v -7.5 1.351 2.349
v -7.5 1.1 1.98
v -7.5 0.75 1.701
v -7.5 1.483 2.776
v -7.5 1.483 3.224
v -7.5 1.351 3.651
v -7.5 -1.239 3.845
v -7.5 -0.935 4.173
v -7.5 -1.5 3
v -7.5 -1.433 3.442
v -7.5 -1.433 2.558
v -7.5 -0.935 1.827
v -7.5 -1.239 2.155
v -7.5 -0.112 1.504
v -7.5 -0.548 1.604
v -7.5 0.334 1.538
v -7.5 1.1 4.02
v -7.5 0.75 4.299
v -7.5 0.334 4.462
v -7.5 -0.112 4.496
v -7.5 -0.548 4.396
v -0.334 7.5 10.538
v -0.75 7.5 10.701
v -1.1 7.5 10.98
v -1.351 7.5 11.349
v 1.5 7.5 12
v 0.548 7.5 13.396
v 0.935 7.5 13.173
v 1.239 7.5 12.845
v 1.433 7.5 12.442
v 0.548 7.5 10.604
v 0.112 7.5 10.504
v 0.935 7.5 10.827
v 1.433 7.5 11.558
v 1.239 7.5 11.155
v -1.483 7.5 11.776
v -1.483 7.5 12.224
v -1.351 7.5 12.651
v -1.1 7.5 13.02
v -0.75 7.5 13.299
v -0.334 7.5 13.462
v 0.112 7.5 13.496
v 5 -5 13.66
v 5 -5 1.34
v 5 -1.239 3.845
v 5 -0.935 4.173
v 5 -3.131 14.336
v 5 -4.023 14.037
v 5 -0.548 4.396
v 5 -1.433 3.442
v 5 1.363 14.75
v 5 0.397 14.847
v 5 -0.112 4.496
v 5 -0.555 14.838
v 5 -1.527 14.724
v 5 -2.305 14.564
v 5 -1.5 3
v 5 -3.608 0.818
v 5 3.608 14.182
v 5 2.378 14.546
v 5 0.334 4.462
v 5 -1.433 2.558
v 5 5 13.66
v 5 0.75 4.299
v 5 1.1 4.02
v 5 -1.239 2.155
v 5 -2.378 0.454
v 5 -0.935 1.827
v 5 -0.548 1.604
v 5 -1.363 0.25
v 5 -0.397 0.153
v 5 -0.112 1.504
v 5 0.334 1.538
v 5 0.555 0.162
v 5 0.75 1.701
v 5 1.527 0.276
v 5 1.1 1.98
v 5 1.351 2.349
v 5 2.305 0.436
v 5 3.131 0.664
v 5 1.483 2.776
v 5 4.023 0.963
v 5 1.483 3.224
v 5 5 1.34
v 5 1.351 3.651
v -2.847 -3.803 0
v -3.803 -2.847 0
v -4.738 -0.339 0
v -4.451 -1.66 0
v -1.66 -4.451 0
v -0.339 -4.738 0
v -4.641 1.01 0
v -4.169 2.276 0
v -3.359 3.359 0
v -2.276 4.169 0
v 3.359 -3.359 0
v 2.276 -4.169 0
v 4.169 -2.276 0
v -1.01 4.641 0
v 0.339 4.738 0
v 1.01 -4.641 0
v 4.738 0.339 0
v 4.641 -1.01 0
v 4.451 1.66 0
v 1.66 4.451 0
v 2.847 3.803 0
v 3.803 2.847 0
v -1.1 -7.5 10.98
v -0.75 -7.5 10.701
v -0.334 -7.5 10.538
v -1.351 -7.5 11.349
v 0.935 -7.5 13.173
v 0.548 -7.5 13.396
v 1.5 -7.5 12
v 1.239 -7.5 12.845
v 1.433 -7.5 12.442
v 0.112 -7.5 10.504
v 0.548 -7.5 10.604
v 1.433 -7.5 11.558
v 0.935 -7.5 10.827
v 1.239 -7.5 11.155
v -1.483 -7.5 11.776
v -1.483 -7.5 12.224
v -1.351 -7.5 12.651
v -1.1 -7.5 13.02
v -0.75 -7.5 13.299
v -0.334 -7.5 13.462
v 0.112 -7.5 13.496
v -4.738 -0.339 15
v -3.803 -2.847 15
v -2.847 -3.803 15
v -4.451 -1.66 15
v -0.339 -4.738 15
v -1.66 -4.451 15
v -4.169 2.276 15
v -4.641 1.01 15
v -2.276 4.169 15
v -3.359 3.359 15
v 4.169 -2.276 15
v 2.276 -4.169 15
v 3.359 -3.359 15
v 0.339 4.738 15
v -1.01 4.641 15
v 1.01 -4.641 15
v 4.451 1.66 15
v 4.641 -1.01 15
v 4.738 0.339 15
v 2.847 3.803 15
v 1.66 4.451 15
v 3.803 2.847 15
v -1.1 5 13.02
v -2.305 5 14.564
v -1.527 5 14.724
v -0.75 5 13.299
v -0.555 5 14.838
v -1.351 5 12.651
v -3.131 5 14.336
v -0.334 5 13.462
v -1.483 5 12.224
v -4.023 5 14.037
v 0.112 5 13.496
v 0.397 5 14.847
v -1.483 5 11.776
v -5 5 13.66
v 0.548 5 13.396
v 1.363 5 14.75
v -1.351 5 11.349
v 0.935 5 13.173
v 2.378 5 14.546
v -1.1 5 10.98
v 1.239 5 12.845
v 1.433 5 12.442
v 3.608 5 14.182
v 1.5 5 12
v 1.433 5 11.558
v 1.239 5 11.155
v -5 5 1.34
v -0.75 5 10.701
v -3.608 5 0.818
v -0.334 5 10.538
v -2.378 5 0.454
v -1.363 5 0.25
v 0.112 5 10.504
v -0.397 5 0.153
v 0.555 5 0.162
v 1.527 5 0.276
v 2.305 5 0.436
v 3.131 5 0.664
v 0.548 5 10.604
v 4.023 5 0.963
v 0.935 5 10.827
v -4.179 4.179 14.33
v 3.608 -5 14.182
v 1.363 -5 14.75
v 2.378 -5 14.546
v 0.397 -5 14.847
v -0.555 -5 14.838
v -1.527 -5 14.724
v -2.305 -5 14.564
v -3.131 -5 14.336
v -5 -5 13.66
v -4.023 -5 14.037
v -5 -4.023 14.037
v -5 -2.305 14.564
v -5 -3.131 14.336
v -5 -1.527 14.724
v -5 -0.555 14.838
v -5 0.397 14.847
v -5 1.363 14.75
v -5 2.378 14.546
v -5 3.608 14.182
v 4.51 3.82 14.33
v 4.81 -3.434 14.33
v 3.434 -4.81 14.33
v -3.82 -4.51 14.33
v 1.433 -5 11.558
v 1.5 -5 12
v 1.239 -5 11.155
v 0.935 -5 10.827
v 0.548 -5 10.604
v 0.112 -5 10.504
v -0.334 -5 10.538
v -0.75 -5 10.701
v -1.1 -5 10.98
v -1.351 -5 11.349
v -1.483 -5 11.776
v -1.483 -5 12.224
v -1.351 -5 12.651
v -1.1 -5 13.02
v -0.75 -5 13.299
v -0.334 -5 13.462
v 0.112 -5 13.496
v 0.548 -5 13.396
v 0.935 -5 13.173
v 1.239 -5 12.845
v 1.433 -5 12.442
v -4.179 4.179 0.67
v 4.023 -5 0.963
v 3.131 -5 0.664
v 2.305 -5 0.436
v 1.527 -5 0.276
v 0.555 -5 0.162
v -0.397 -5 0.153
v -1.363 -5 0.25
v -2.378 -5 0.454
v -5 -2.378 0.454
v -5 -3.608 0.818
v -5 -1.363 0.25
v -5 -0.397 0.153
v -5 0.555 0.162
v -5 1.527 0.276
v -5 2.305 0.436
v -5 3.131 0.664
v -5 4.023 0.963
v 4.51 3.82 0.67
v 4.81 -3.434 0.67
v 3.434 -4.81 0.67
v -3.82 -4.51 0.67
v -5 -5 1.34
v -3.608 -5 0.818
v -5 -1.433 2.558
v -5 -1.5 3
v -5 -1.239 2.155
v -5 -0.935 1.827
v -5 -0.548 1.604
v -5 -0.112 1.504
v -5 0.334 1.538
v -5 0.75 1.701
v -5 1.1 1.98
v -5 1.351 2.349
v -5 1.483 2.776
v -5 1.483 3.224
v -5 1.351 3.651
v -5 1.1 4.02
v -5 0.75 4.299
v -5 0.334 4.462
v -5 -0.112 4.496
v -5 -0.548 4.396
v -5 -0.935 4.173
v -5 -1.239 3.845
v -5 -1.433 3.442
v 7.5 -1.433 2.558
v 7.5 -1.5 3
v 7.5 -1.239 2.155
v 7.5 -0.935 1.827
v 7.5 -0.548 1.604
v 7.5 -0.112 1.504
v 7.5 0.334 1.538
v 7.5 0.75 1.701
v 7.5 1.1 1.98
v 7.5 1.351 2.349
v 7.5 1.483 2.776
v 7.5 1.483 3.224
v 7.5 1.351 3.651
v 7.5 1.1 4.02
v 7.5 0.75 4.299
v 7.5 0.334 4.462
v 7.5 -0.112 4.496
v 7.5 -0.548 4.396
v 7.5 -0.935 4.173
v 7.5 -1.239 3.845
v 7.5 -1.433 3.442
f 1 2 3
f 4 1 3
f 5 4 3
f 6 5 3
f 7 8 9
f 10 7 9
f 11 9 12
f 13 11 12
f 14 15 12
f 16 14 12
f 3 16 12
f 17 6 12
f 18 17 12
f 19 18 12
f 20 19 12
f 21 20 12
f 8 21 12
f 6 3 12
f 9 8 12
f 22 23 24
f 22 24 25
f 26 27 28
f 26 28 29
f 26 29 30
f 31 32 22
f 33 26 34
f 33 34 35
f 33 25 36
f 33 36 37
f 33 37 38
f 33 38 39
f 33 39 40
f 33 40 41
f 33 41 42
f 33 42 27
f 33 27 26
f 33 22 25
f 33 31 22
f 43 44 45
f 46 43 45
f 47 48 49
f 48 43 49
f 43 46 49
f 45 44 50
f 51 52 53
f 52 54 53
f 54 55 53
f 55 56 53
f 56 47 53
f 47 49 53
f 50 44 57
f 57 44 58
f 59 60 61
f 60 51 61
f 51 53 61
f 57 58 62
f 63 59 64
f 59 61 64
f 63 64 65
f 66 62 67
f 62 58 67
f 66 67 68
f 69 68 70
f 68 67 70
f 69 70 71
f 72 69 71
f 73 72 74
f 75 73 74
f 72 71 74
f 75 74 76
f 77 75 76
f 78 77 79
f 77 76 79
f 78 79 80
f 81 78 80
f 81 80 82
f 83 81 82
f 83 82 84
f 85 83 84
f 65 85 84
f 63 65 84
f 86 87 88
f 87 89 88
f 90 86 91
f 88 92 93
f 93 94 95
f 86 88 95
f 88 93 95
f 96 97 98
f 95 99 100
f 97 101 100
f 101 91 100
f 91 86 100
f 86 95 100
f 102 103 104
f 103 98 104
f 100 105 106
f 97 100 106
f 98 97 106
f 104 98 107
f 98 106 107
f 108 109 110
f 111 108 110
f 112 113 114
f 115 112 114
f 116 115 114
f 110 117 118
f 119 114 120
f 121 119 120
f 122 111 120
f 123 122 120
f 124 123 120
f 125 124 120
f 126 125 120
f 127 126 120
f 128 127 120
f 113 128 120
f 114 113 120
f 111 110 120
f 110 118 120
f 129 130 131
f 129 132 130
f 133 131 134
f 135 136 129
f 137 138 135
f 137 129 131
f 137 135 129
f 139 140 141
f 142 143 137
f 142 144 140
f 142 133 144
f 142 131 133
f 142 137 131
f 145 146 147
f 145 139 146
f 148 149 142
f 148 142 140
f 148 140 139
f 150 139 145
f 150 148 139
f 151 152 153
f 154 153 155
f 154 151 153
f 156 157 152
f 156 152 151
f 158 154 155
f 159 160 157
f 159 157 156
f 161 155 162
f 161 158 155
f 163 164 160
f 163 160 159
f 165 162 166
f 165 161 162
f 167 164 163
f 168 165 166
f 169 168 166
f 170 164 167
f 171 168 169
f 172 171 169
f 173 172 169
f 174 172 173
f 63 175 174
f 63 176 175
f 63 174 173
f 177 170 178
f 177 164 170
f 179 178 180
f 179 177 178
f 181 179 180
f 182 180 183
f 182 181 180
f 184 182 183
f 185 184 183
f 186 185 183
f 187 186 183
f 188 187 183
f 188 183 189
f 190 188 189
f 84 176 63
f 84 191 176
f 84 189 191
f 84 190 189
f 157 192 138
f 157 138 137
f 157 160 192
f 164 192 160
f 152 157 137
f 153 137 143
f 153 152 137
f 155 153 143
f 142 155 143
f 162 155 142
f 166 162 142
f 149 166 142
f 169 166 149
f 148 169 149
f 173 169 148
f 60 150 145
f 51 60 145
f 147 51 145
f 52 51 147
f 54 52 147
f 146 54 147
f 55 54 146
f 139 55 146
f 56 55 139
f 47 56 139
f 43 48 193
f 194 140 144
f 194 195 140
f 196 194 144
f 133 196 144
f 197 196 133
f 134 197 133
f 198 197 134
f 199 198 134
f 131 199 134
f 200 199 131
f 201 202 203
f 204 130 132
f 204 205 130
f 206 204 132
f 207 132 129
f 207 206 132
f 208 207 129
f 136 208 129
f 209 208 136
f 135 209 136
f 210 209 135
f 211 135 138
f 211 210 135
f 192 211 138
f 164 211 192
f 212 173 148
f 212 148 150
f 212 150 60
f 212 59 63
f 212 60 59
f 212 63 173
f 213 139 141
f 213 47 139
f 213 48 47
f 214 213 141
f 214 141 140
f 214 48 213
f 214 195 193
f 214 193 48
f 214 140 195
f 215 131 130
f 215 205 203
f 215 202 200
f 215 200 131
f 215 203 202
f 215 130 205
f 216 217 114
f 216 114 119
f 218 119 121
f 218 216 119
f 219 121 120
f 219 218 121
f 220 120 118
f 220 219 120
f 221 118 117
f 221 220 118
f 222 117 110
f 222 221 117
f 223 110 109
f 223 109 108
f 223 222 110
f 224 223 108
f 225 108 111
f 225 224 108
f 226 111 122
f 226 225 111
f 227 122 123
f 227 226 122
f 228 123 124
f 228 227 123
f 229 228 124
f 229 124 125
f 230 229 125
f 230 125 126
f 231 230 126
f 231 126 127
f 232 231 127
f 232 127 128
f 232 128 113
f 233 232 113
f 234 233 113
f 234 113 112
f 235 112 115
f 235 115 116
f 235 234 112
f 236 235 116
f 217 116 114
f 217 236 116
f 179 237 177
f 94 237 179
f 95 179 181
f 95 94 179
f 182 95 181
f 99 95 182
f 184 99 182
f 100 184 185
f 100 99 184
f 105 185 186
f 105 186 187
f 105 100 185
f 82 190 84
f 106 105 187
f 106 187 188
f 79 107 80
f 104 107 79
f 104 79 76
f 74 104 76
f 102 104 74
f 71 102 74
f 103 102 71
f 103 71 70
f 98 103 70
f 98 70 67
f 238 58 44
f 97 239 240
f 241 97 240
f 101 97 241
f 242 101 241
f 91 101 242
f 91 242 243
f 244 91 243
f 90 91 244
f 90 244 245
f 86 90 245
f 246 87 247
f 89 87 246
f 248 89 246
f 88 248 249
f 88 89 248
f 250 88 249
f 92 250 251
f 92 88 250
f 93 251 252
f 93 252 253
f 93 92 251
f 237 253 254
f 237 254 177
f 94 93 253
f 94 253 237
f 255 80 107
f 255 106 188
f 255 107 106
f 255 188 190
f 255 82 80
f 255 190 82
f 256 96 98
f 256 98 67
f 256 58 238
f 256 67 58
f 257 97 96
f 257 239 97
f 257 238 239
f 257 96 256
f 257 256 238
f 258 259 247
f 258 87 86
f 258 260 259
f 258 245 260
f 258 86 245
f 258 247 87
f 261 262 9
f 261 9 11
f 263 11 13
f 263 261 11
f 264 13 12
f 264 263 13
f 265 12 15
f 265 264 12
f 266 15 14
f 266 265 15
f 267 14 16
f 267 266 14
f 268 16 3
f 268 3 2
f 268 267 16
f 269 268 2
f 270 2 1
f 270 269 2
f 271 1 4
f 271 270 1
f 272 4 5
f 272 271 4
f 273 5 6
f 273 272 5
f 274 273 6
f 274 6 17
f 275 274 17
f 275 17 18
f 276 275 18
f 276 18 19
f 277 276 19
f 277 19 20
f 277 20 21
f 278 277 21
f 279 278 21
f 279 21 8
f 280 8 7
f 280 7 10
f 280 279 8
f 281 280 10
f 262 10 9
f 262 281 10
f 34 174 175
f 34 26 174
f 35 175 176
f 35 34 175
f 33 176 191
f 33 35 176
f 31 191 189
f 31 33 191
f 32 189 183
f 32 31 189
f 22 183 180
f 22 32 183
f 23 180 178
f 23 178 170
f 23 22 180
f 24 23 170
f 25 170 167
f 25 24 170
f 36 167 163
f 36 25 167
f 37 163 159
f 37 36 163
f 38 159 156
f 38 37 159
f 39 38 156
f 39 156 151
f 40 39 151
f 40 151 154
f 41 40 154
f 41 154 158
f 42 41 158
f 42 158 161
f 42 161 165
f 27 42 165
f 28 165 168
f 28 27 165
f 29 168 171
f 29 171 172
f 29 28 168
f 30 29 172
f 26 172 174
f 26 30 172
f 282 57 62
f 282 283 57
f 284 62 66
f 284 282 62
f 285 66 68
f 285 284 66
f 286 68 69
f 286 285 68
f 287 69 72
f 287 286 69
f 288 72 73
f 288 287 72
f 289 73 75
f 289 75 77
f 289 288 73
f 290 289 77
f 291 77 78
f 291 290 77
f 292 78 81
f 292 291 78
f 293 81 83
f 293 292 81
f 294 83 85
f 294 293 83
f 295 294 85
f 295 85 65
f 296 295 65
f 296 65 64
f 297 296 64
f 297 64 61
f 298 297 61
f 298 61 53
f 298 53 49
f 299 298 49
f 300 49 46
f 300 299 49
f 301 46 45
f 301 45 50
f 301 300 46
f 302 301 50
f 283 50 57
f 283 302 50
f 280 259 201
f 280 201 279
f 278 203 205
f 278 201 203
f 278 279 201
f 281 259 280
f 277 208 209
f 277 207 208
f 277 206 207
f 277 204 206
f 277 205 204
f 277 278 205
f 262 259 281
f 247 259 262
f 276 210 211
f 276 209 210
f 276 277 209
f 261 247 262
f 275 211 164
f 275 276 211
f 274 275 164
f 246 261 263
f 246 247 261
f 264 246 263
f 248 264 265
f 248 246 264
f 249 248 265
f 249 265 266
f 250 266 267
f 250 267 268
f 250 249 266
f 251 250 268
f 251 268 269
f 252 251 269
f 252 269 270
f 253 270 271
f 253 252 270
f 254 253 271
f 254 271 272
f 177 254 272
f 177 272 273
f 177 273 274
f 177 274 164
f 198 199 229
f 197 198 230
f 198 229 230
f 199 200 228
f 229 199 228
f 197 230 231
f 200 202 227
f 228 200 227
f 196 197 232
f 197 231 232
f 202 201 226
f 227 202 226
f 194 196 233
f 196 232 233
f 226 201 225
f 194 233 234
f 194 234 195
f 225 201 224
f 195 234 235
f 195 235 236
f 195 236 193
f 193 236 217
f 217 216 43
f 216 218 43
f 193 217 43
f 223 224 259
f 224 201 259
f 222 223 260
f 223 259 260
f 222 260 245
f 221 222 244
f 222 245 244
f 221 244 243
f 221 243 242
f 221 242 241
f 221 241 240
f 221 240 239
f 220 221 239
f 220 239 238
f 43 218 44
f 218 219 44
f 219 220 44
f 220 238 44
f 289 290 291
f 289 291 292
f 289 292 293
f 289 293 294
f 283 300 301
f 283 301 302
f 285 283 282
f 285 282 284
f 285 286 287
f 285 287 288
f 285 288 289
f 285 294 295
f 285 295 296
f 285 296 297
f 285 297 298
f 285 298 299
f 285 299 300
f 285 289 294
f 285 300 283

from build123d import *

# Parameters (mm, degrees)
SKETCH1_W           = 10
SKETCH1_H           = 10
BOSS_EXTRUDE1_DEPTH = 15
SKETCH3_R           = 1.5
BOSS_EXTRUDE2_DEPTH = 7.5
SKETCH4_R           = 1.5
BOSS_EXTRUDE3_DEPTH = 7.5


with BuildPart() as part:
    # Sketch1 → Boss-Extrude1 (new body)
    with BuildSketch(Plane.XY):
        Rectangle(SKETCH1_W, SKETCH1_H)
    extrude(amount=BOSS_EXTRUDE1_DEPTH)

    # Sketch2 → Cut-Revolve1 (revolve, cut)
    with BuildSketch(Plane(origin=(0, 0, 0), x_dir=(1, 0, 0), z_dir=(0, 1, 0)), mode=Mode.PRIVATE) as cut_revolve1_sk:
        Polygon((-4.75, 0), (-15.04, 0), (-15.04, -15), (-4.75, -15), (-12.5, -10.525535414), (-12.5, -4.474464586), align=None)
    revolve(cut_revolve1_sk.sketch.rotate(Axis((0, 0, 15.75), (0, 0, -1)), 44.999991596), axis=Axis((0, 0, 15.75), (0, 0, -1)), mode=Mode.SUBTRACT)

    # Sketch3 → Boss-Extrude2 (add, symmetric)
    with BuildSketch(Plane(origin=(0, 0, 0), x_dir=(1, 0, 0), z_dir=(0, 1, 0))):
        with Locations((0, -12)):
            Circle(SKETCH3_R)
    extrude(amount=BOSS_EXTRUDE2_DEPTH, both=True)

    # Sketch4 → Boss-Extrude3 (add, symmetric)
    with BuildSketch(Plane(origin=(0, 0, 0), x_dir=(0, 0, -1), z_dir=(1, 0, 0))):
        with Locations(Location((-3, 0, 0), (0, 0, 270))):
            Circle(SKETCH4_R)
    extrude(amount=BOSS_EXTRUDE3_DEPTH, both=True)


solid = part.part
